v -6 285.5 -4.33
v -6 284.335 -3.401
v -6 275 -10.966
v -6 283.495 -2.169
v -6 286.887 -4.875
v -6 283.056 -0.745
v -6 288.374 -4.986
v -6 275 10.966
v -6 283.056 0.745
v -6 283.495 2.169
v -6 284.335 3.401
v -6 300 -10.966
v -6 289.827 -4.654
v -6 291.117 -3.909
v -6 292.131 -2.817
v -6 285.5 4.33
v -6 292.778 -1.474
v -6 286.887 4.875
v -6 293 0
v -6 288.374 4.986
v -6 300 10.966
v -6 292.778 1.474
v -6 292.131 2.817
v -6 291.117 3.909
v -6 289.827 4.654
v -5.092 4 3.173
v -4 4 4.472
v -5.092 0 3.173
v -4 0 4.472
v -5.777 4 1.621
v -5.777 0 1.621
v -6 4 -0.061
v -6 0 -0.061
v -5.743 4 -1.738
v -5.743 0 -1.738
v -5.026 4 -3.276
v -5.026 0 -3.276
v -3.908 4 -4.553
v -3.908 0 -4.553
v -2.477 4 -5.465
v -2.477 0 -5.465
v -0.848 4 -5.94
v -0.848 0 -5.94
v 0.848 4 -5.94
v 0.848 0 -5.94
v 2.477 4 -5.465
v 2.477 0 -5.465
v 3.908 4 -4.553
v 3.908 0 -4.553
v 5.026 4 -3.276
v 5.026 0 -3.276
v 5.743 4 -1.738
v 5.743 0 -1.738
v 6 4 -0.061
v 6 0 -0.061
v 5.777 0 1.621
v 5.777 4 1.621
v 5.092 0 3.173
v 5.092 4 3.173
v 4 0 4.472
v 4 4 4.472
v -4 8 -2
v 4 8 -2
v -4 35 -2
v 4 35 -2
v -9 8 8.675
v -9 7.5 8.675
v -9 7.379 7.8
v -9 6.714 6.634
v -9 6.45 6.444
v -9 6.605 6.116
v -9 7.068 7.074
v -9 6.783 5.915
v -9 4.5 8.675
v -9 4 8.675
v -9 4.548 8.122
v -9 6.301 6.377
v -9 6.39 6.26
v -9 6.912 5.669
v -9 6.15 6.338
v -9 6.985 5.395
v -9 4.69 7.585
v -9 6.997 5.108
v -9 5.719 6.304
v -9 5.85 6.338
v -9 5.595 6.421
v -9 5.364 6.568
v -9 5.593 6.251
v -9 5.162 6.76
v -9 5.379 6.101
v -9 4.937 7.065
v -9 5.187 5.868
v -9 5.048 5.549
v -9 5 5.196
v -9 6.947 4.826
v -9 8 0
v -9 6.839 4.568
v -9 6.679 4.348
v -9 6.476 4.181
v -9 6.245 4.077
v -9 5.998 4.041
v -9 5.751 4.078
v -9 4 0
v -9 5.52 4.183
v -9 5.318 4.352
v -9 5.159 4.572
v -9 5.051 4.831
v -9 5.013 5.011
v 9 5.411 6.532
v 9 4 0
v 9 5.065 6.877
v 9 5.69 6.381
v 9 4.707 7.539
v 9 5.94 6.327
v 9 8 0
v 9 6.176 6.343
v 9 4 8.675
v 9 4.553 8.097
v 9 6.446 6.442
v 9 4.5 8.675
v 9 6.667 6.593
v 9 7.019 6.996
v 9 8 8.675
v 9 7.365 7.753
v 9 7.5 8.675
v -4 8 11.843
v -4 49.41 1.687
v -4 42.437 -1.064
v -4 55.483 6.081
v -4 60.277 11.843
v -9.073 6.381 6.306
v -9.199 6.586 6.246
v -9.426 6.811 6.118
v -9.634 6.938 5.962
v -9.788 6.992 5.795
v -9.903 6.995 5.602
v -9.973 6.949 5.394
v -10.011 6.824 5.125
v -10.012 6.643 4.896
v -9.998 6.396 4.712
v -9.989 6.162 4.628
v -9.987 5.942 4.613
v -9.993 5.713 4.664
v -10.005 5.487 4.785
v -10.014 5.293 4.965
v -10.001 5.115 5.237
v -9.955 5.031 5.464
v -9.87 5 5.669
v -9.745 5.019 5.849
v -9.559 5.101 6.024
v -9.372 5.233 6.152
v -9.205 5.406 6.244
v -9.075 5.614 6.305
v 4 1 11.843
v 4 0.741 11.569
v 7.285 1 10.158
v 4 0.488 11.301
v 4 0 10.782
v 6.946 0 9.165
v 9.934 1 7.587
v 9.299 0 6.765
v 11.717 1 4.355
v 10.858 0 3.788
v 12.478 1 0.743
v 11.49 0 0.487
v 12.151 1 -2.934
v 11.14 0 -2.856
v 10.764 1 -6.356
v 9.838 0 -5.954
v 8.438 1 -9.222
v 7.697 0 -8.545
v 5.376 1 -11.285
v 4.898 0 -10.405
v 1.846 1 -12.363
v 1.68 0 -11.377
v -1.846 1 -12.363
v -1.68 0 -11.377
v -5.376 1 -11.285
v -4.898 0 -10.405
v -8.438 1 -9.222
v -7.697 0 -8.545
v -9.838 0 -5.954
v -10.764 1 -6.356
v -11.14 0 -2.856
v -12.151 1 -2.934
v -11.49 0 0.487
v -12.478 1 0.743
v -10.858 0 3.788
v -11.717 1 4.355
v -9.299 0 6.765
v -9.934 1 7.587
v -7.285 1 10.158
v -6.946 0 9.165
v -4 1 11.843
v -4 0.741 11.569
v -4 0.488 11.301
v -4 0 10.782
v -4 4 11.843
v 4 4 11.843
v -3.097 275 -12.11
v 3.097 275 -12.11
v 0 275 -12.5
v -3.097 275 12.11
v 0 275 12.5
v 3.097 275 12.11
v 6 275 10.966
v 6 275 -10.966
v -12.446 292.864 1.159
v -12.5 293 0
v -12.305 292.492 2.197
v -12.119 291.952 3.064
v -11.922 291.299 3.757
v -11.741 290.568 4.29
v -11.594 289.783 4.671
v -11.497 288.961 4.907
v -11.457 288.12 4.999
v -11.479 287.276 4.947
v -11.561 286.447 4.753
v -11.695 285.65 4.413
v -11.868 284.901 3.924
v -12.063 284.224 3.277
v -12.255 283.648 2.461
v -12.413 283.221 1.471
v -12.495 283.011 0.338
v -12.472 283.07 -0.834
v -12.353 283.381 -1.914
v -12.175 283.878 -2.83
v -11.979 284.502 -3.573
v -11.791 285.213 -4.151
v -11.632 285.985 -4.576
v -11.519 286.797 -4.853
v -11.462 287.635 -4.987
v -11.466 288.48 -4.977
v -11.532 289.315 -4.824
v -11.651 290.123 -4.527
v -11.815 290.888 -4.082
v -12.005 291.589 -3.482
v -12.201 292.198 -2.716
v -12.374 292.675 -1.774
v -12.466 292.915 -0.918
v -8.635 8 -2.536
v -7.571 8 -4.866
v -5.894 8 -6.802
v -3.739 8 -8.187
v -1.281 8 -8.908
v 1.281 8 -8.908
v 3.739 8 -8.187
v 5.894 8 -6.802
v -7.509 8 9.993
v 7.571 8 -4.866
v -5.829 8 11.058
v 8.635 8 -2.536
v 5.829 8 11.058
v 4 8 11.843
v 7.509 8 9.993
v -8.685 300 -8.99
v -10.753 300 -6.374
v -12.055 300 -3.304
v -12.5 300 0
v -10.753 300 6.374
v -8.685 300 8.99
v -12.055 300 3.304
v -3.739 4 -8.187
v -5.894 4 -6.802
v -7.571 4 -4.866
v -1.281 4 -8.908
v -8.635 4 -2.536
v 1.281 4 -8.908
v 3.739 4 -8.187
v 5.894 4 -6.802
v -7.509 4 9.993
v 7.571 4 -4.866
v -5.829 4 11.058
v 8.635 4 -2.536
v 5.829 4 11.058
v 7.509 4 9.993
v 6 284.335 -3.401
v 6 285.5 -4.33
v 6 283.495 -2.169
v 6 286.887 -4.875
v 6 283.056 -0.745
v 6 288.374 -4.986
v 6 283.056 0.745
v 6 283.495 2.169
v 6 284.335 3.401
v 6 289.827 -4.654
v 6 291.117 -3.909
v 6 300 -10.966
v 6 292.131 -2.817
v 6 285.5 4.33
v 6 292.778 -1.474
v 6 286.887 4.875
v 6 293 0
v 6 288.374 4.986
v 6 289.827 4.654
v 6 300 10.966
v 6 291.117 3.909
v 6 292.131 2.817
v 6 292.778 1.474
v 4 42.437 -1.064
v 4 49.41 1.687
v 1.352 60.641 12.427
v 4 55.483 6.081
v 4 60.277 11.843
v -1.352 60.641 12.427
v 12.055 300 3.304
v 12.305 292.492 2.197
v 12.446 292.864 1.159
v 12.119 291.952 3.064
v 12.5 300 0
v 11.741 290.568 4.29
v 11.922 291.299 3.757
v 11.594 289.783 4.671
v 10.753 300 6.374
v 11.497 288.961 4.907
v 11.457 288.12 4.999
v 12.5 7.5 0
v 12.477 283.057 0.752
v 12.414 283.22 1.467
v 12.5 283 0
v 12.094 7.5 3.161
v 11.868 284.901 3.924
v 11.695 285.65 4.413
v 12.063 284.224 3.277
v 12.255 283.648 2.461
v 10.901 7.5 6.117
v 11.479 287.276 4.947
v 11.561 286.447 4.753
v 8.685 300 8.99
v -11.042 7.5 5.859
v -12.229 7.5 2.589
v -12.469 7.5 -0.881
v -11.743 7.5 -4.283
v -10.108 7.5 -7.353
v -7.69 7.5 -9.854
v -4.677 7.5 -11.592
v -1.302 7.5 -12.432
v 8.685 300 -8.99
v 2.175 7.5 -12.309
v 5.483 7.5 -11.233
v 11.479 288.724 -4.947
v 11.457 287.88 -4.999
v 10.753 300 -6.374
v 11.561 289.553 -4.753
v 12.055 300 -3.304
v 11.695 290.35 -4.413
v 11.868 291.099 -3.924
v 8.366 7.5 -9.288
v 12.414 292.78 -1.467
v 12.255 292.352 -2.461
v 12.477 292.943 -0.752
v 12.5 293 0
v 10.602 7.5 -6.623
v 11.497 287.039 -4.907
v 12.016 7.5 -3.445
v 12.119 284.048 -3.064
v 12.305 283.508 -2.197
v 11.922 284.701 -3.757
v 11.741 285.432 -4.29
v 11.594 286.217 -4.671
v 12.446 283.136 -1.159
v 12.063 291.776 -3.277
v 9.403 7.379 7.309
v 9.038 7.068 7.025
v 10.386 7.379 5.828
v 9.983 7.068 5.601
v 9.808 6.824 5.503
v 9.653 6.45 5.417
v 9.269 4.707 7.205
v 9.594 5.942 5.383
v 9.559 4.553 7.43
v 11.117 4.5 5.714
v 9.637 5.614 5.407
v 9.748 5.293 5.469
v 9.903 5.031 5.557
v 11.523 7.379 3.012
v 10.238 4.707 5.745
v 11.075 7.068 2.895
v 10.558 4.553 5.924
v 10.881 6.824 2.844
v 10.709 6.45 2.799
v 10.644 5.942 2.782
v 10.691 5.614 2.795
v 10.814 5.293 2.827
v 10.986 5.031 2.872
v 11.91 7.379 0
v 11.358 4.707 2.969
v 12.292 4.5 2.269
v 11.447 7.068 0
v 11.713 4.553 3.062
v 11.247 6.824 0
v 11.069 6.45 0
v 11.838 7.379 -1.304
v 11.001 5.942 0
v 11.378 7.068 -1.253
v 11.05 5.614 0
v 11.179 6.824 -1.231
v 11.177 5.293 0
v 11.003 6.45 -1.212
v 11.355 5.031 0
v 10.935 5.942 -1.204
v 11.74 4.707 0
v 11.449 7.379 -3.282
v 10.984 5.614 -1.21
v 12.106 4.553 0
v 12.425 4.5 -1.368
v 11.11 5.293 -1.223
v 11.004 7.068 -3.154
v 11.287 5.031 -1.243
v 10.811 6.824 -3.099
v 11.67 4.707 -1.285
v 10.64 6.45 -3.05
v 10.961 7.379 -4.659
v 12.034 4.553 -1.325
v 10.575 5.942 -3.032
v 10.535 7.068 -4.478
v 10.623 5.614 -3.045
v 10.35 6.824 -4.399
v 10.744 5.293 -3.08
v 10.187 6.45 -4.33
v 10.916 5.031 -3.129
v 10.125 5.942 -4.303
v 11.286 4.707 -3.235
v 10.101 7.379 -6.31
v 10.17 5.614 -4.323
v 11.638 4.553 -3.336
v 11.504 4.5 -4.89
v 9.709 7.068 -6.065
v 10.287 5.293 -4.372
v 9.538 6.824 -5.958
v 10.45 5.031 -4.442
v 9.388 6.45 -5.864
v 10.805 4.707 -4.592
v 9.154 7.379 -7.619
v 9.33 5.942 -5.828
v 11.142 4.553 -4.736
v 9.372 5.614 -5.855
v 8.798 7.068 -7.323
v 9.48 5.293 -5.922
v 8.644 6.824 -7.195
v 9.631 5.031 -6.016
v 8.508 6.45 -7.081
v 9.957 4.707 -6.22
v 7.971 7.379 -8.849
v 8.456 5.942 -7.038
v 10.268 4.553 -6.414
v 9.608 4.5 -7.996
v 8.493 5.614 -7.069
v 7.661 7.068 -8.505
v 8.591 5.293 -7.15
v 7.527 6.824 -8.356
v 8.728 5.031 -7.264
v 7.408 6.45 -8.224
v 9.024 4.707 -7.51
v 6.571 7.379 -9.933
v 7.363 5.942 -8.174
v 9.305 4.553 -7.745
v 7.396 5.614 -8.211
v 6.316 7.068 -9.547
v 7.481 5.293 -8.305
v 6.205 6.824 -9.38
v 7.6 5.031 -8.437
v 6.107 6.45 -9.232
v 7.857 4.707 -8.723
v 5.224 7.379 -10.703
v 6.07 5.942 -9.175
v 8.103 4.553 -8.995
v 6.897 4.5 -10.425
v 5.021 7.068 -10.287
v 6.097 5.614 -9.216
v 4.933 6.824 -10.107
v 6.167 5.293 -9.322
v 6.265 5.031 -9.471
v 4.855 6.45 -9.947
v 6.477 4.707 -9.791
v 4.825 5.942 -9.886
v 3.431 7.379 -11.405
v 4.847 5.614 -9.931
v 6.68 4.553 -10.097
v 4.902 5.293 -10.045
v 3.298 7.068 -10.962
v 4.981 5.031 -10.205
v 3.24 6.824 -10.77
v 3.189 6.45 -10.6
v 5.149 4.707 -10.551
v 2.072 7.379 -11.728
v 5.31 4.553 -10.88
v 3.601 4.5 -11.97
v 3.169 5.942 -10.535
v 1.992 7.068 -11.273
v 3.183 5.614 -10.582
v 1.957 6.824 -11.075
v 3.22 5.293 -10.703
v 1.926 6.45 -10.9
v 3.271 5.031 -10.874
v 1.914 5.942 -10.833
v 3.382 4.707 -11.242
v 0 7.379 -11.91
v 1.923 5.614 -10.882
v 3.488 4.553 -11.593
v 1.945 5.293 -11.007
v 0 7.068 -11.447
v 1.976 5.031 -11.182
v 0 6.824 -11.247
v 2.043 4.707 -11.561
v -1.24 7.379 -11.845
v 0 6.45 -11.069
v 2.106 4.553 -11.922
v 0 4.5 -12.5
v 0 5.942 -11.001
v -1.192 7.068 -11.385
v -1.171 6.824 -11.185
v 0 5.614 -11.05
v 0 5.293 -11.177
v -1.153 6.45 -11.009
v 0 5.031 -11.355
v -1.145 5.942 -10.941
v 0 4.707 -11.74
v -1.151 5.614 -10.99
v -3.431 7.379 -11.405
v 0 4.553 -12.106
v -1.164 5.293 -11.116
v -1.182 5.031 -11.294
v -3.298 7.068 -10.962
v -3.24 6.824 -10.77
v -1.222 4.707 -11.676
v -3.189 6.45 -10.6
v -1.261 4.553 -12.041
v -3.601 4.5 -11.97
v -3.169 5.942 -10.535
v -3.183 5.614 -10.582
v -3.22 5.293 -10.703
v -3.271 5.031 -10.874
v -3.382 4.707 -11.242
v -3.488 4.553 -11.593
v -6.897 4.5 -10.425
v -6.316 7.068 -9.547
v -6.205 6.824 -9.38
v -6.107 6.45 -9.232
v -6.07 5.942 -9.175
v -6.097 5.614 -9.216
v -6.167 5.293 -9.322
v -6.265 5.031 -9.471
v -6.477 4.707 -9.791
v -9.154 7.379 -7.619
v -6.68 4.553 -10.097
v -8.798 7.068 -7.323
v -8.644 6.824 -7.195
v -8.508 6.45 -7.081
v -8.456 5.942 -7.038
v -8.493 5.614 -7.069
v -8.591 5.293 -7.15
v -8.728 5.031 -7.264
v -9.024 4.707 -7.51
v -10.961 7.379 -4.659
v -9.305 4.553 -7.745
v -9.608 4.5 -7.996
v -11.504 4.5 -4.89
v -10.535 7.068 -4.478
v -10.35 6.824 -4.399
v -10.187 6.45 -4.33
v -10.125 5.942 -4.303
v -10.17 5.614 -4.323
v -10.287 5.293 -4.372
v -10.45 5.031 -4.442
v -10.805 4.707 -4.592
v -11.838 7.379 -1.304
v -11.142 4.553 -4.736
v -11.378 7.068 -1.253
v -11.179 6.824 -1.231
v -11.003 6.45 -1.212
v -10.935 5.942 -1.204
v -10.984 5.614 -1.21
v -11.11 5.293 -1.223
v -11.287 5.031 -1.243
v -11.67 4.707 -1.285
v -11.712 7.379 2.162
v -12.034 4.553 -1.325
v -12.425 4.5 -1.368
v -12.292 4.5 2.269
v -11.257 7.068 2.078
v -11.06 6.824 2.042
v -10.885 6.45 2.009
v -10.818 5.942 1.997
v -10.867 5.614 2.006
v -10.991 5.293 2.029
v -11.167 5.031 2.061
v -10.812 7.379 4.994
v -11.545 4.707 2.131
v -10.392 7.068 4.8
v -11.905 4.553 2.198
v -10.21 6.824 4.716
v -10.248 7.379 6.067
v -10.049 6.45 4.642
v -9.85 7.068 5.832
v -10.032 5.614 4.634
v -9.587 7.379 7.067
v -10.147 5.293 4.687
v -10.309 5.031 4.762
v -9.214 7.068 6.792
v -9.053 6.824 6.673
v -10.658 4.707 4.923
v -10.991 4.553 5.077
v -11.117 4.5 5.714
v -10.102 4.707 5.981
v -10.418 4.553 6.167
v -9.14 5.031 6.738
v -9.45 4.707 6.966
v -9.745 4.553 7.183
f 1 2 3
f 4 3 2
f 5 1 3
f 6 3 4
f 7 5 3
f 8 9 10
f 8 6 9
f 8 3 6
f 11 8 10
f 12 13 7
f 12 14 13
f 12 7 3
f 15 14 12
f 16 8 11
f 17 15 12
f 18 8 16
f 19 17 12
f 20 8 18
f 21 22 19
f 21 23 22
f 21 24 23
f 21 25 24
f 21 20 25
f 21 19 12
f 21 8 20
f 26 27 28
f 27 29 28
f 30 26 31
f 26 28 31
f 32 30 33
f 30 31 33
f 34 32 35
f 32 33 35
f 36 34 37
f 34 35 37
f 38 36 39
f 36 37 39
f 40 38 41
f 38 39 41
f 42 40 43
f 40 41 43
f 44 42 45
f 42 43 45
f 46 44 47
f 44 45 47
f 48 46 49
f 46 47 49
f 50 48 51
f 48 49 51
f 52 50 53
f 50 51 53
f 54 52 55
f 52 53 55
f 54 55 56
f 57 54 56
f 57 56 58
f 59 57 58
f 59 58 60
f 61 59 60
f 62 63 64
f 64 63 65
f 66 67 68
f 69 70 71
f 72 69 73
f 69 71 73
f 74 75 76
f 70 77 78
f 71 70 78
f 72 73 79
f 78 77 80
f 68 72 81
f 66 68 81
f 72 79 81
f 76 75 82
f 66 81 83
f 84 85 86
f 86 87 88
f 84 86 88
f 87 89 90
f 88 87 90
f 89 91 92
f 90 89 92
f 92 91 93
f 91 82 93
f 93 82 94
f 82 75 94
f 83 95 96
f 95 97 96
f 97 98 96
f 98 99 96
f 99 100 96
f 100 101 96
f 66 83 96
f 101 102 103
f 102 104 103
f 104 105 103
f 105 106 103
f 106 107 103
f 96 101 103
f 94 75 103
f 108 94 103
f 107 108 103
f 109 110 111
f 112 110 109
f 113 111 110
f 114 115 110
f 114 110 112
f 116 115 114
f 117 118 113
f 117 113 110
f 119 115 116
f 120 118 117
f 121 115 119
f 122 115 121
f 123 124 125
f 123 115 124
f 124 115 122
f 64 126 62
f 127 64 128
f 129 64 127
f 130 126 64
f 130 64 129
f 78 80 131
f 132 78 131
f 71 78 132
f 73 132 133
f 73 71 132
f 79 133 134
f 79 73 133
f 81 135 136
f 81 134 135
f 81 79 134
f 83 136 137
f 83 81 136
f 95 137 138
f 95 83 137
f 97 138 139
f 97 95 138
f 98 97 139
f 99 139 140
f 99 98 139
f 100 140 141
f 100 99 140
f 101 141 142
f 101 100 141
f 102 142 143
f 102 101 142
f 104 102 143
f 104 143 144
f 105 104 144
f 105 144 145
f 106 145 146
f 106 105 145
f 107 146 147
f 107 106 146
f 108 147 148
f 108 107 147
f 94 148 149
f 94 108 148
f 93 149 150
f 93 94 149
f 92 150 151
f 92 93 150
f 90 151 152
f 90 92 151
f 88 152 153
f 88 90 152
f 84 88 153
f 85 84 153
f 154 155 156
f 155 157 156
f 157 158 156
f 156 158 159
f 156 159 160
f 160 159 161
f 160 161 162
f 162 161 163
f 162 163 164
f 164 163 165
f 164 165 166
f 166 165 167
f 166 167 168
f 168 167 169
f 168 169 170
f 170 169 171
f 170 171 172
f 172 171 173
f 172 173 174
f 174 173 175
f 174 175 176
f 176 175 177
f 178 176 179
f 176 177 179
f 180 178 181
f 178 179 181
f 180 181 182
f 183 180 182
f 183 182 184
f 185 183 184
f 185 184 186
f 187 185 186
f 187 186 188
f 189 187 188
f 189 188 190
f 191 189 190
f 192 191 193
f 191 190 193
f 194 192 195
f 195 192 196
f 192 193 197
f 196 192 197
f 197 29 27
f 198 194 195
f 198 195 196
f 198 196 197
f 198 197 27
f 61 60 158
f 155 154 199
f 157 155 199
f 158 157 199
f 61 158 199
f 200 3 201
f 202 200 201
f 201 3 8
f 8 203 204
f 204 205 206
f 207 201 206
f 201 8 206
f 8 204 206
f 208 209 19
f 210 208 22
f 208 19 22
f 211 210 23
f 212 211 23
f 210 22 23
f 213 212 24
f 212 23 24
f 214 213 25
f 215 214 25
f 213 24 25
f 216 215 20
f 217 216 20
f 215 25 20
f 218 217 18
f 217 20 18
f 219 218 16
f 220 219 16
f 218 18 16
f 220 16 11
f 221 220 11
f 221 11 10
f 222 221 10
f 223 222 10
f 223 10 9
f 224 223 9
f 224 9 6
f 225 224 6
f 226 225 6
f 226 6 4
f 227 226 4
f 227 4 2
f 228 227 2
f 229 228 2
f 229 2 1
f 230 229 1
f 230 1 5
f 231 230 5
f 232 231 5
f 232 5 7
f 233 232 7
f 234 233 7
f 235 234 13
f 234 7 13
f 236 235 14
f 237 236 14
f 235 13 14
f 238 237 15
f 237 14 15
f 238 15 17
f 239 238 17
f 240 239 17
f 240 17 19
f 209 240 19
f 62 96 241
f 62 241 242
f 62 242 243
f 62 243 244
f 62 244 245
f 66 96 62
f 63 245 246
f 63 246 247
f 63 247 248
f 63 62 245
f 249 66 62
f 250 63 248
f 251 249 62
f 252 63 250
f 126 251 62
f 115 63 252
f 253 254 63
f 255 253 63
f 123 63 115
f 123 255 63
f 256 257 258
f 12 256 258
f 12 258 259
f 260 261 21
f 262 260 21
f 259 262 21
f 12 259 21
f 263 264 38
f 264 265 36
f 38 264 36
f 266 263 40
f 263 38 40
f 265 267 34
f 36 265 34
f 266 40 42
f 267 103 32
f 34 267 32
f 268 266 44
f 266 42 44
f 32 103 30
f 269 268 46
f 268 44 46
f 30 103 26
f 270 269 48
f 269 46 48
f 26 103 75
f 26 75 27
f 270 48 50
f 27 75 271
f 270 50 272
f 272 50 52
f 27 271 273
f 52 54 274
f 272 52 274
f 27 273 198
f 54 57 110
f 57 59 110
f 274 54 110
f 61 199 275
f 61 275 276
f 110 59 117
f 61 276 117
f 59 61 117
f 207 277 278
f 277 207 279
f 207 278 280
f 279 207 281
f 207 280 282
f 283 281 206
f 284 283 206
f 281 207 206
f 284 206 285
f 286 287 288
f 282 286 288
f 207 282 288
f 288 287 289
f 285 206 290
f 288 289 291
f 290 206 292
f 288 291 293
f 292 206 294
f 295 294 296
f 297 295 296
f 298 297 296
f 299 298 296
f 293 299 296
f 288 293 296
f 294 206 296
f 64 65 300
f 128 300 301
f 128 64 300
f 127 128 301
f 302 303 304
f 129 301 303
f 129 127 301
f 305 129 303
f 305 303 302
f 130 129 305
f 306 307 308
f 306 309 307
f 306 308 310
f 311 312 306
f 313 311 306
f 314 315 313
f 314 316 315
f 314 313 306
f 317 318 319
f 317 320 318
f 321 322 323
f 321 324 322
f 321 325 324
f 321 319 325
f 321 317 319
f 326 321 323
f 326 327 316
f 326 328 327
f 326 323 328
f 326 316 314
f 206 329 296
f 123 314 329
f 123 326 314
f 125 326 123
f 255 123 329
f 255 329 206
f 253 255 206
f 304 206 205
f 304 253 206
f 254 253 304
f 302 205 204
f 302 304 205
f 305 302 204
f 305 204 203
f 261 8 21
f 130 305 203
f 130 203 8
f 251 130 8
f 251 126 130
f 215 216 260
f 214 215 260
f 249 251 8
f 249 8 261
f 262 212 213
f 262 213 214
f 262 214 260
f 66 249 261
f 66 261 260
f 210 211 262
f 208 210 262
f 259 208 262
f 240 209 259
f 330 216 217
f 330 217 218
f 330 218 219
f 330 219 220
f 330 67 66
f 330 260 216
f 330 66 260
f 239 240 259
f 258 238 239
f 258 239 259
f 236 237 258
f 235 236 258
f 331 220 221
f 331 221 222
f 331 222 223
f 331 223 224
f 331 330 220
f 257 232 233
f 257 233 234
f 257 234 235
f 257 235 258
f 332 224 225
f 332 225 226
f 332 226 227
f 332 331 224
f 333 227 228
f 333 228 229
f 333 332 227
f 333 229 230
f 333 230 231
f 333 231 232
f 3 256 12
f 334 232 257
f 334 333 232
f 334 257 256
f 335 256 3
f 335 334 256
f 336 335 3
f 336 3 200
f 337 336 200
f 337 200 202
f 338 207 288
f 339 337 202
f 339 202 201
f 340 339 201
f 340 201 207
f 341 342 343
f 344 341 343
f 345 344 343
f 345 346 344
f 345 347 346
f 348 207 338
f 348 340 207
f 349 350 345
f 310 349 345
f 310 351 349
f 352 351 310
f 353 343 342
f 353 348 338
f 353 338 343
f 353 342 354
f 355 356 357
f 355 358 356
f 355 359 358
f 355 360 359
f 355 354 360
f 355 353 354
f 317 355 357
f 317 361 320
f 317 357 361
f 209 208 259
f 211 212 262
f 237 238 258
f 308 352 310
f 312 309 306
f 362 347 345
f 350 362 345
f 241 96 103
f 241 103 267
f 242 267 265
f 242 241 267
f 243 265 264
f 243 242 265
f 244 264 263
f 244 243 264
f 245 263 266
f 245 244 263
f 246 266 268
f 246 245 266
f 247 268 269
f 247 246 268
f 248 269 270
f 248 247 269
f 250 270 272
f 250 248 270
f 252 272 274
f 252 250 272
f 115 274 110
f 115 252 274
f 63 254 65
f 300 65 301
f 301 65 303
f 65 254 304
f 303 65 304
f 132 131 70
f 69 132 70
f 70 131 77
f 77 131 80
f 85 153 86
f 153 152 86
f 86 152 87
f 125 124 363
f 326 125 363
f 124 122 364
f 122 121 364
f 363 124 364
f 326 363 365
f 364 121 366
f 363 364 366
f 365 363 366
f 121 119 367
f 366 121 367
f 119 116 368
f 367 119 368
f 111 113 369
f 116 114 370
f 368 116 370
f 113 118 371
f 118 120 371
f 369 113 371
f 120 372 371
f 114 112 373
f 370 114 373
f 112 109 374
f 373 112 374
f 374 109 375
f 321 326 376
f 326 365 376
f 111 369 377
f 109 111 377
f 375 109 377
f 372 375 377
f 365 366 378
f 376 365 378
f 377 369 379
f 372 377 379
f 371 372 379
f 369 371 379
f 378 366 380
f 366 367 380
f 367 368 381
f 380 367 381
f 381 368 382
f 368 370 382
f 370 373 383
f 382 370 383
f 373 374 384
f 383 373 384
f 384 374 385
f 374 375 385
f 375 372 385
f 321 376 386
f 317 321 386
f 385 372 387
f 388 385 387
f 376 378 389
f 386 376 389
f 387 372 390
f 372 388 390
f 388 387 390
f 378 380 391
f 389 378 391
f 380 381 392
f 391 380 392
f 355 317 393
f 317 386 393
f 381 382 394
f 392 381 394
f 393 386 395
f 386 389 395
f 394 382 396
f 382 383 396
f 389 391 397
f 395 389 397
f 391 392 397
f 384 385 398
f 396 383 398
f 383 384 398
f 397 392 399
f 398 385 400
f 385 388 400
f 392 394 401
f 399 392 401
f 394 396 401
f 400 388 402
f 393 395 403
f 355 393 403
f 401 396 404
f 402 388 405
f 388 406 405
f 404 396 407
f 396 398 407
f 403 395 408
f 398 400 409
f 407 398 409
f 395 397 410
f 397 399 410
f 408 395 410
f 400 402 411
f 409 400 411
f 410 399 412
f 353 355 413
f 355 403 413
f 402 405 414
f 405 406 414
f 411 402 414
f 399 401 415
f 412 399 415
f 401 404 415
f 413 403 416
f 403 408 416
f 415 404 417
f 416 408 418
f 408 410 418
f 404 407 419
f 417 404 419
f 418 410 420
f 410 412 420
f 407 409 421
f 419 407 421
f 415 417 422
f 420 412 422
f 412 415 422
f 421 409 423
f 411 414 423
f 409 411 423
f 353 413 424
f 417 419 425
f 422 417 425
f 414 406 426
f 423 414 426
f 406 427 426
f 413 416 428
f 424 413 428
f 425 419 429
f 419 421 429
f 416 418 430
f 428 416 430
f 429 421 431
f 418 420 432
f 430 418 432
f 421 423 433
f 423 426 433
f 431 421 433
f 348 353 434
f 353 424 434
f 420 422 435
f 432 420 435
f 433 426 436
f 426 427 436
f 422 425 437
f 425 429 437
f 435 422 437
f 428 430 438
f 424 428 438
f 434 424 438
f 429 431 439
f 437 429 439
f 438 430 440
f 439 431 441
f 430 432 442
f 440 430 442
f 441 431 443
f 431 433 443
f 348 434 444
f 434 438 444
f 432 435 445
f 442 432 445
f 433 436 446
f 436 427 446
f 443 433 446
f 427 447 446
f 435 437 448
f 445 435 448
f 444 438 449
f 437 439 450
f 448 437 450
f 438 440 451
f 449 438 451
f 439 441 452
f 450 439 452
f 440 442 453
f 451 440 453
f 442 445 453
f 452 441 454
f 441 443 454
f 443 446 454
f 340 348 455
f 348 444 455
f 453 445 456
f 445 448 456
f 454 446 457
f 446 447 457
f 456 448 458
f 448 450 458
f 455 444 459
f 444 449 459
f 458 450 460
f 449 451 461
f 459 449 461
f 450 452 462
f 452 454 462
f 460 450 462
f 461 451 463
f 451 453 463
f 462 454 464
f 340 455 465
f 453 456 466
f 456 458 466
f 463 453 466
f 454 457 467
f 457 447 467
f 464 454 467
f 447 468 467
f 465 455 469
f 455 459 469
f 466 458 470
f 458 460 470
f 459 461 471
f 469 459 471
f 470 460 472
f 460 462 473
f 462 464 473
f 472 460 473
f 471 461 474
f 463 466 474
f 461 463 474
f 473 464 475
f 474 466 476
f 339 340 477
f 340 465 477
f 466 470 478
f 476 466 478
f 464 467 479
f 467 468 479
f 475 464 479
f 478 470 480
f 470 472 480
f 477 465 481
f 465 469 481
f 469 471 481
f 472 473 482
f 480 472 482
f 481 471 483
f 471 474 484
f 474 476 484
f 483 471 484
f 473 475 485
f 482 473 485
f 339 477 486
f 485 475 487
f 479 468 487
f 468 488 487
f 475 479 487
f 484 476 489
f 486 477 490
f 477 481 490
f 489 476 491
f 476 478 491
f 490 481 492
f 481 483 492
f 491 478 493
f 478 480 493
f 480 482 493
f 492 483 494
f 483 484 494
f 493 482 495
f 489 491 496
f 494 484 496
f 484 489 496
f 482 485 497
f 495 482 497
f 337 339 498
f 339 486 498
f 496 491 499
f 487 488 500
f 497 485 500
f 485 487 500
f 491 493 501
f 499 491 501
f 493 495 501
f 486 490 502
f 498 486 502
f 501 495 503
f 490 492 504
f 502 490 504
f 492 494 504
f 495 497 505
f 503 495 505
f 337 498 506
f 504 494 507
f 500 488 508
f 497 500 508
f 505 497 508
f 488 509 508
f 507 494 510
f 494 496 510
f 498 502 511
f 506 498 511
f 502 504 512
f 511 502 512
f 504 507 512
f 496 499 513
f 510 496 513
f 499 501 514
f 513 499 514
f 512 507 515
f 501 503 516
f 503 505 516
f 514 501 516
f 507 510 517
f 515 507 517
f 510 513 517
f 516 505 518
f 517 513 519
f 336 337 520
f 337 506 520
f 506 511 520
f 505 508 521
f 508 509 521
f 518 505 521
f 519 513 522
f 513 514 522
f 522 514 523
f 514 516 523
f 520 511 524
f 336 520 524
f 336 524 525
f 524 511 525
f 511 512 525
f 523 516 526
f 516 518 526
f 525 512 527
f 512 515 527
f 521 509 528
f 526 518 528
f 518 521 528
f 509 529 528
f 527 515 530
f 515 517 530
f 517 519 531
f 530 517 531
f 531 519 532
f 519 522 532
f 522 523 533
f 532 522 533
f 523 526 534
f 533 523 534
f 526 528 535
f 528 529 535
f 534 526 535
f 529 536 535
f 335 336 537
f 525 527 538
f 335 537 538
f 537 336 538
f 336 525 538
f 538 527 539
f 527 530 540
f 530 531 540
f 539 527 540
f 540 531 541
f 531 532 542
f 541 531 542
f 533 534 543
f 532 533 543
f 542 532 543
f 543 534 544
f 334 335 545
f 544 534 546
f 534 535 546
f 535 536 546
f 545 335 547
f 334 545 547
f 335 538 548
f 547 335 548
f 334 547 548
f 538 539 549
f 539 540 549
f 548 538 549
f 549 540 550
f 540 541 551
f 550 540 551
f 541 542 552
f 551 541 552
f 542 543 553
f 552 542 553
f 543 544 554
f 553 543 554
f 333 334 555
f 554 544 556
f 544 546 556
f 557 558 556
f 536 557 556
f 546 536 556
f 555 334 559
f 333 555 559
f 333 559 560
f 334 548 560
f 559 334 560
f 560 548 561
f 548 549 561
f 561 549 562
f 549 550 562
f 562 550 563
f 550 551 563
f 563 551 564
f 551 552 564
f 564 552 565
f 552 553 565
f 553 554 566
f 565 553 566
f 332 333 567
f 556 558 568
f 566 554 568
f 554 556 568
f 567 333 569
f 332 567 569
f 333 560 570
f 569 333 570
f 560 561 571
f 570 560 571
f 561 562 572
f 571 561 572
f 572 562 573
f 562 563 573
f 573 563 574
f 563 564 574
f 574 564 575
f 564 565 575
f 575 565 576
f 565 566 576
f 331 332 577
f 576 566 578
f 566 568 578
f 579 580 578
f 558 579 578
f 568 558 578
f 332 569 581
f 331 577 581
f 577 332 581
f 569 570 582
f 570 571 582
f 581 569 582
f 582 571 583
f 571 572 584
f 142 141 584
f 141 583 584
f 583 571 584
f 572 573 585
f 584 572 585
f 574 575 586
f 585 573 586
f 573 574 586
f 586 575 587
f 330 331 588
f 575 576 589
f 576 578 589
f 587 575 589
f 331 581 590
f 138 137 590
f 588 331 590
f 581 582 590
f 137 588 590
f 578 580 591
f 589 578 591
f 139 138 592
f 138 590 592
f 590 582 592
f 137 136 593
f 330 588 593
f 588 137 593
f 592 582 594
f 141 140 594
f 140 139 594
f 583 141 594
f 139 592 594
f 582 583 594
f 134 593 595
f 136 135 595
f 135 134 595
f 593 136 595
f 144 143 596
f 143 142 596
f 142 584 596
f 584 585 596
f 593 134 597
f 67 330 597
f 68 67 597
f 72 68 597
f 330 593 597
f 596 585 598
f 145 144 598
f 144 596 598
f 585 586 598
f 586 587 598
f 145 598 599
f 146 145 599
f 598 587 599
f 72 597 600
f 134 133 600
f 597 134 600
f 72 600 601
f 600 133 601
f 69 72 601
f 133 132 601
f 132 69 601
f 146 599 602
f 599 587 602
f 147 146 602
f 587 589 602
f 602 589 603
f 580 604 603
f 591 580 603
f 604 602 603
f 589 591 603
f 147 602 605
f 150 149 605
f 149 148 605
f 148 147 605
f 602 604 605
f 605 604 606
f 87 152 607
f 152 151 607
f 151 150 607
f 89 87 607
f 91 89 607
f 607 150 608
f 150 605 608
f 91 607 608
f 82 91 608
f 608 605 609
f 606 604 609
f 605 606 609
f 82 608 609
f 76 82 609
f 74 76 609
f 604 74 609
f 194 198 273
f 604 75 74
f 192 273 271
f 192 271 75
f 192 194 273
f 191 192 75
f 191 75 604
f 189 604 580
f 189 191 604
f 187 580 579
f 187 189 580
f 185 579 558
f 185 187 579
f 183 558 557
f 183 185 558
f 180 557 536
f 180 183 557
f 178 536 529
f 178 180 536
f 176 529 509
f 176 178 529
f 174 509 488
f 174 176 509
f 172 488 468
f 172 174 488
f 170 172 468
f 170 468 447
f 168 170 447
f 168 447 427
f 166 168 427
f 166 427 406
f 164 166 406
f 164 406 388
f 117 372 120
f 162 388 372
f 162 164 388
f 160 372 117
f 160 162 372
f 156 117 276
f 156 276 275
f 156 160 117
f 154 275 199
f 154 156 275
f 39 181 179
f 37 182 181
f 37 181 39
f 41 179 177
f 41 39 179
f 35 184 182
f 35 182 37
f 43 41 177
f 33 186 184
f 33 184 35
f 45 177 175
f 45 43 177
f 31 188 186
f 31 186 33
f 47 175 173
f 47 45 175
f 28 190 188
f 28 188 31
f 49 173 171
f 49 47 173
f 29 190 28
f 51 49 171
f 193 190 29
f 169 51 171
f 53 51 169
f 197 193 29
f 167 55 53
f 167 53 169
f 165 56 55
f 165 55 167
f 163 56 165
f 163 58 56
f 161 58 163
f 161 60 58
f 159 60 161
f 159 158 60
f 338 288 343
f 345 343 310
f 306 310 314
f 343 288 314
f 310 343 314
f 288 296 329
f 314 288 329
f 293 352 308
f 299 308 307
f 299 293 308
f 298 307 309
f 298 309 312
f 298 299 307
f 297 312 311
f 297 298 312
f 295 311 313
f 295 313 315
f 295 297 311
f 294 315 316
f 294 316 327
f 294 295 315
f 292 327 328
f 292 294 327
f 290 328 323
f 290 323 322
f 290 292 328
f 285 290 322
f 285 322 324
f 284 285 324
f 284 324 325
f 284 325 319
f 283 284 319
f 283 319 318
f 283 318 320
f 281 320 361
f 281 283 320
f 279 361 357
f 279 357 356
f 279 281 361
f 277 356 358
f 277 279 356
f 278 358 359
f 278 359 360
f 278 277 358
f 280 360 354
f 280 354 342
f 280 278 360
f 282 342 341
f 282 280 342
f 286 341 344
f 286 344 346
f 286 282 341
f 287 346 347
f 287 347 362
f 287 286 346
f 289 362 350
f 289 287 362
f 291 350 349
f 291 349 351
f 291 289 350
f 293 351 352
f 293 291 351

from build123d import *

# Parameters (mm, degrees)
F0_R           = 12.5
F1_DEPTH       = 300
F2_W           = 12
F2_H           = 50
F3_DEPTH       = 12.501
F3_DEPTH_BACK  = 12.501
F4_R           = 5
F5_DEPTH       = 12.501
F5_DEPTH_BACK  = 12.501
F7_DEPTH       = 4
F7_DEPTH_BACK  = 4
F10_DEPTH      = 2
F10_DEPTH_BACK = 2
F11_R          = 6
F12_DEPTH      = 8
F13_R          = 1.5
F15_SIZE       = 1
F18_R          = 1
F19_DEPTH      = 17.076317684


with BuildPart() as f1:
    # F0 (on Front) → F1 (new body)
    with BuildSketch(Plane.XZ):
        Circle(F0_R)
    extrude(amount=-F1_DEPTH)

    # F2 (on Top) → F3 (cut, two sides)
    with BuildSketch(Plane.XY) as f3_sk:
        with Locations((0, 300)):
            Rectangle(F2_W, F2_H)
    extrude(amount=-F3_DEPTH, mode=Mode.SUBTRACT)
    extrude(f3_sk.sketch, amount=F3_DEPTH_BACK, mode=Mode.SUBTRACT)

    # F4 (on Right) → F5 (cut, two sides)
    with BuildSketch(Plane.YZ) as f5_sk:
        with Locations((288, 0)):
            Circle(F4_R)
    extrude(amount=-F5_DEPTH, mode=Mode.SUBTRACT)
    extrude(f5_sk.sketch, amount=F5_DEPTH_BACK, mode=Mode.SUBTRACT)

    # F6 (on Right) → F7 (cut, two sides)
    with BuildSketch(Plane.YZ) as f7_sk:
        with BuildLine():
            Line((0, 43.2144903421), (0, -2))
            Line((0, -2), (35, -2))
            ThreePointArc((35, -2), (56.2132034356, 6.7867965644), (65, 28))
            Line((65, 28), (65, 43.2144903421))
            Line((65, 43.2144903421), (0, 43.2144903421))
        make_face()
    extrude(amount=F7_DEPTH, mode=Mode.SUBTRACT)
    extrude(f7_sk.sketch, amount=-F7_DEPTH_BACK, mode=Mode.SUBTRACT)

    # F9 (on offset) → F10 (cut, two sides)
    with BuildSketch(Plane.XZ.offset(-6)) as f10_sk:
        with BuildLine():
            Line((-9, 23.9692713934), (-9, 0))
            ThreePointArc((-9, 0), (0, -9), (9, 0))
            Line((9, 0), (9, 23.9692713934))
            Line((9, 23.9692713934), (-9, 23.9692713934))
        make_face()
    extrude(amount=-F10_DEPTH, mode=Mode.SUBTRACT)
    extrude(f10_sk.sketch, amount=F10_DEPTH_BACK, mode=Mode.SUBTRACT)

    # F11 (on Front) → F12 (cut, through all)
    with BuildSketch(Plane.XZ):
        Circle(F11_R)
    extrude(amount=-F12_DEPTH, mode=Mode.SUBTRACT)

    # F13 (on Top) → F14 (revolve, cut)
    with BuildSketch(Plane.XY):
        with Locations((12.5, 6)):
            Circle(F13_R)
    revolve(axis=Axis((0, 7.8222351149, 0), (0, 1, 0)), mode=Mode.SUBTRACT)

    # F15
    f15_edges = [f1.edges().sort_by_distance(p)[0] for p in [
        (0, 0, -12.5),
    ]]
    chamfer(f15_edges, length=F15_SIZE)

    # F18 (on line) → F19 (cut, through all)
    with BuildSketch(Plane(origin=(0, 0, 0), x_dir=(0, -1, 0), z_dir=(-0.8660254038, 0, 0.5))):
        with Locations((-6, 0)):
            Circle(F18_R)
    extrude(amount=F19_DEPTH, mode=Mode.SUBTRACT)


solid = f1.part
